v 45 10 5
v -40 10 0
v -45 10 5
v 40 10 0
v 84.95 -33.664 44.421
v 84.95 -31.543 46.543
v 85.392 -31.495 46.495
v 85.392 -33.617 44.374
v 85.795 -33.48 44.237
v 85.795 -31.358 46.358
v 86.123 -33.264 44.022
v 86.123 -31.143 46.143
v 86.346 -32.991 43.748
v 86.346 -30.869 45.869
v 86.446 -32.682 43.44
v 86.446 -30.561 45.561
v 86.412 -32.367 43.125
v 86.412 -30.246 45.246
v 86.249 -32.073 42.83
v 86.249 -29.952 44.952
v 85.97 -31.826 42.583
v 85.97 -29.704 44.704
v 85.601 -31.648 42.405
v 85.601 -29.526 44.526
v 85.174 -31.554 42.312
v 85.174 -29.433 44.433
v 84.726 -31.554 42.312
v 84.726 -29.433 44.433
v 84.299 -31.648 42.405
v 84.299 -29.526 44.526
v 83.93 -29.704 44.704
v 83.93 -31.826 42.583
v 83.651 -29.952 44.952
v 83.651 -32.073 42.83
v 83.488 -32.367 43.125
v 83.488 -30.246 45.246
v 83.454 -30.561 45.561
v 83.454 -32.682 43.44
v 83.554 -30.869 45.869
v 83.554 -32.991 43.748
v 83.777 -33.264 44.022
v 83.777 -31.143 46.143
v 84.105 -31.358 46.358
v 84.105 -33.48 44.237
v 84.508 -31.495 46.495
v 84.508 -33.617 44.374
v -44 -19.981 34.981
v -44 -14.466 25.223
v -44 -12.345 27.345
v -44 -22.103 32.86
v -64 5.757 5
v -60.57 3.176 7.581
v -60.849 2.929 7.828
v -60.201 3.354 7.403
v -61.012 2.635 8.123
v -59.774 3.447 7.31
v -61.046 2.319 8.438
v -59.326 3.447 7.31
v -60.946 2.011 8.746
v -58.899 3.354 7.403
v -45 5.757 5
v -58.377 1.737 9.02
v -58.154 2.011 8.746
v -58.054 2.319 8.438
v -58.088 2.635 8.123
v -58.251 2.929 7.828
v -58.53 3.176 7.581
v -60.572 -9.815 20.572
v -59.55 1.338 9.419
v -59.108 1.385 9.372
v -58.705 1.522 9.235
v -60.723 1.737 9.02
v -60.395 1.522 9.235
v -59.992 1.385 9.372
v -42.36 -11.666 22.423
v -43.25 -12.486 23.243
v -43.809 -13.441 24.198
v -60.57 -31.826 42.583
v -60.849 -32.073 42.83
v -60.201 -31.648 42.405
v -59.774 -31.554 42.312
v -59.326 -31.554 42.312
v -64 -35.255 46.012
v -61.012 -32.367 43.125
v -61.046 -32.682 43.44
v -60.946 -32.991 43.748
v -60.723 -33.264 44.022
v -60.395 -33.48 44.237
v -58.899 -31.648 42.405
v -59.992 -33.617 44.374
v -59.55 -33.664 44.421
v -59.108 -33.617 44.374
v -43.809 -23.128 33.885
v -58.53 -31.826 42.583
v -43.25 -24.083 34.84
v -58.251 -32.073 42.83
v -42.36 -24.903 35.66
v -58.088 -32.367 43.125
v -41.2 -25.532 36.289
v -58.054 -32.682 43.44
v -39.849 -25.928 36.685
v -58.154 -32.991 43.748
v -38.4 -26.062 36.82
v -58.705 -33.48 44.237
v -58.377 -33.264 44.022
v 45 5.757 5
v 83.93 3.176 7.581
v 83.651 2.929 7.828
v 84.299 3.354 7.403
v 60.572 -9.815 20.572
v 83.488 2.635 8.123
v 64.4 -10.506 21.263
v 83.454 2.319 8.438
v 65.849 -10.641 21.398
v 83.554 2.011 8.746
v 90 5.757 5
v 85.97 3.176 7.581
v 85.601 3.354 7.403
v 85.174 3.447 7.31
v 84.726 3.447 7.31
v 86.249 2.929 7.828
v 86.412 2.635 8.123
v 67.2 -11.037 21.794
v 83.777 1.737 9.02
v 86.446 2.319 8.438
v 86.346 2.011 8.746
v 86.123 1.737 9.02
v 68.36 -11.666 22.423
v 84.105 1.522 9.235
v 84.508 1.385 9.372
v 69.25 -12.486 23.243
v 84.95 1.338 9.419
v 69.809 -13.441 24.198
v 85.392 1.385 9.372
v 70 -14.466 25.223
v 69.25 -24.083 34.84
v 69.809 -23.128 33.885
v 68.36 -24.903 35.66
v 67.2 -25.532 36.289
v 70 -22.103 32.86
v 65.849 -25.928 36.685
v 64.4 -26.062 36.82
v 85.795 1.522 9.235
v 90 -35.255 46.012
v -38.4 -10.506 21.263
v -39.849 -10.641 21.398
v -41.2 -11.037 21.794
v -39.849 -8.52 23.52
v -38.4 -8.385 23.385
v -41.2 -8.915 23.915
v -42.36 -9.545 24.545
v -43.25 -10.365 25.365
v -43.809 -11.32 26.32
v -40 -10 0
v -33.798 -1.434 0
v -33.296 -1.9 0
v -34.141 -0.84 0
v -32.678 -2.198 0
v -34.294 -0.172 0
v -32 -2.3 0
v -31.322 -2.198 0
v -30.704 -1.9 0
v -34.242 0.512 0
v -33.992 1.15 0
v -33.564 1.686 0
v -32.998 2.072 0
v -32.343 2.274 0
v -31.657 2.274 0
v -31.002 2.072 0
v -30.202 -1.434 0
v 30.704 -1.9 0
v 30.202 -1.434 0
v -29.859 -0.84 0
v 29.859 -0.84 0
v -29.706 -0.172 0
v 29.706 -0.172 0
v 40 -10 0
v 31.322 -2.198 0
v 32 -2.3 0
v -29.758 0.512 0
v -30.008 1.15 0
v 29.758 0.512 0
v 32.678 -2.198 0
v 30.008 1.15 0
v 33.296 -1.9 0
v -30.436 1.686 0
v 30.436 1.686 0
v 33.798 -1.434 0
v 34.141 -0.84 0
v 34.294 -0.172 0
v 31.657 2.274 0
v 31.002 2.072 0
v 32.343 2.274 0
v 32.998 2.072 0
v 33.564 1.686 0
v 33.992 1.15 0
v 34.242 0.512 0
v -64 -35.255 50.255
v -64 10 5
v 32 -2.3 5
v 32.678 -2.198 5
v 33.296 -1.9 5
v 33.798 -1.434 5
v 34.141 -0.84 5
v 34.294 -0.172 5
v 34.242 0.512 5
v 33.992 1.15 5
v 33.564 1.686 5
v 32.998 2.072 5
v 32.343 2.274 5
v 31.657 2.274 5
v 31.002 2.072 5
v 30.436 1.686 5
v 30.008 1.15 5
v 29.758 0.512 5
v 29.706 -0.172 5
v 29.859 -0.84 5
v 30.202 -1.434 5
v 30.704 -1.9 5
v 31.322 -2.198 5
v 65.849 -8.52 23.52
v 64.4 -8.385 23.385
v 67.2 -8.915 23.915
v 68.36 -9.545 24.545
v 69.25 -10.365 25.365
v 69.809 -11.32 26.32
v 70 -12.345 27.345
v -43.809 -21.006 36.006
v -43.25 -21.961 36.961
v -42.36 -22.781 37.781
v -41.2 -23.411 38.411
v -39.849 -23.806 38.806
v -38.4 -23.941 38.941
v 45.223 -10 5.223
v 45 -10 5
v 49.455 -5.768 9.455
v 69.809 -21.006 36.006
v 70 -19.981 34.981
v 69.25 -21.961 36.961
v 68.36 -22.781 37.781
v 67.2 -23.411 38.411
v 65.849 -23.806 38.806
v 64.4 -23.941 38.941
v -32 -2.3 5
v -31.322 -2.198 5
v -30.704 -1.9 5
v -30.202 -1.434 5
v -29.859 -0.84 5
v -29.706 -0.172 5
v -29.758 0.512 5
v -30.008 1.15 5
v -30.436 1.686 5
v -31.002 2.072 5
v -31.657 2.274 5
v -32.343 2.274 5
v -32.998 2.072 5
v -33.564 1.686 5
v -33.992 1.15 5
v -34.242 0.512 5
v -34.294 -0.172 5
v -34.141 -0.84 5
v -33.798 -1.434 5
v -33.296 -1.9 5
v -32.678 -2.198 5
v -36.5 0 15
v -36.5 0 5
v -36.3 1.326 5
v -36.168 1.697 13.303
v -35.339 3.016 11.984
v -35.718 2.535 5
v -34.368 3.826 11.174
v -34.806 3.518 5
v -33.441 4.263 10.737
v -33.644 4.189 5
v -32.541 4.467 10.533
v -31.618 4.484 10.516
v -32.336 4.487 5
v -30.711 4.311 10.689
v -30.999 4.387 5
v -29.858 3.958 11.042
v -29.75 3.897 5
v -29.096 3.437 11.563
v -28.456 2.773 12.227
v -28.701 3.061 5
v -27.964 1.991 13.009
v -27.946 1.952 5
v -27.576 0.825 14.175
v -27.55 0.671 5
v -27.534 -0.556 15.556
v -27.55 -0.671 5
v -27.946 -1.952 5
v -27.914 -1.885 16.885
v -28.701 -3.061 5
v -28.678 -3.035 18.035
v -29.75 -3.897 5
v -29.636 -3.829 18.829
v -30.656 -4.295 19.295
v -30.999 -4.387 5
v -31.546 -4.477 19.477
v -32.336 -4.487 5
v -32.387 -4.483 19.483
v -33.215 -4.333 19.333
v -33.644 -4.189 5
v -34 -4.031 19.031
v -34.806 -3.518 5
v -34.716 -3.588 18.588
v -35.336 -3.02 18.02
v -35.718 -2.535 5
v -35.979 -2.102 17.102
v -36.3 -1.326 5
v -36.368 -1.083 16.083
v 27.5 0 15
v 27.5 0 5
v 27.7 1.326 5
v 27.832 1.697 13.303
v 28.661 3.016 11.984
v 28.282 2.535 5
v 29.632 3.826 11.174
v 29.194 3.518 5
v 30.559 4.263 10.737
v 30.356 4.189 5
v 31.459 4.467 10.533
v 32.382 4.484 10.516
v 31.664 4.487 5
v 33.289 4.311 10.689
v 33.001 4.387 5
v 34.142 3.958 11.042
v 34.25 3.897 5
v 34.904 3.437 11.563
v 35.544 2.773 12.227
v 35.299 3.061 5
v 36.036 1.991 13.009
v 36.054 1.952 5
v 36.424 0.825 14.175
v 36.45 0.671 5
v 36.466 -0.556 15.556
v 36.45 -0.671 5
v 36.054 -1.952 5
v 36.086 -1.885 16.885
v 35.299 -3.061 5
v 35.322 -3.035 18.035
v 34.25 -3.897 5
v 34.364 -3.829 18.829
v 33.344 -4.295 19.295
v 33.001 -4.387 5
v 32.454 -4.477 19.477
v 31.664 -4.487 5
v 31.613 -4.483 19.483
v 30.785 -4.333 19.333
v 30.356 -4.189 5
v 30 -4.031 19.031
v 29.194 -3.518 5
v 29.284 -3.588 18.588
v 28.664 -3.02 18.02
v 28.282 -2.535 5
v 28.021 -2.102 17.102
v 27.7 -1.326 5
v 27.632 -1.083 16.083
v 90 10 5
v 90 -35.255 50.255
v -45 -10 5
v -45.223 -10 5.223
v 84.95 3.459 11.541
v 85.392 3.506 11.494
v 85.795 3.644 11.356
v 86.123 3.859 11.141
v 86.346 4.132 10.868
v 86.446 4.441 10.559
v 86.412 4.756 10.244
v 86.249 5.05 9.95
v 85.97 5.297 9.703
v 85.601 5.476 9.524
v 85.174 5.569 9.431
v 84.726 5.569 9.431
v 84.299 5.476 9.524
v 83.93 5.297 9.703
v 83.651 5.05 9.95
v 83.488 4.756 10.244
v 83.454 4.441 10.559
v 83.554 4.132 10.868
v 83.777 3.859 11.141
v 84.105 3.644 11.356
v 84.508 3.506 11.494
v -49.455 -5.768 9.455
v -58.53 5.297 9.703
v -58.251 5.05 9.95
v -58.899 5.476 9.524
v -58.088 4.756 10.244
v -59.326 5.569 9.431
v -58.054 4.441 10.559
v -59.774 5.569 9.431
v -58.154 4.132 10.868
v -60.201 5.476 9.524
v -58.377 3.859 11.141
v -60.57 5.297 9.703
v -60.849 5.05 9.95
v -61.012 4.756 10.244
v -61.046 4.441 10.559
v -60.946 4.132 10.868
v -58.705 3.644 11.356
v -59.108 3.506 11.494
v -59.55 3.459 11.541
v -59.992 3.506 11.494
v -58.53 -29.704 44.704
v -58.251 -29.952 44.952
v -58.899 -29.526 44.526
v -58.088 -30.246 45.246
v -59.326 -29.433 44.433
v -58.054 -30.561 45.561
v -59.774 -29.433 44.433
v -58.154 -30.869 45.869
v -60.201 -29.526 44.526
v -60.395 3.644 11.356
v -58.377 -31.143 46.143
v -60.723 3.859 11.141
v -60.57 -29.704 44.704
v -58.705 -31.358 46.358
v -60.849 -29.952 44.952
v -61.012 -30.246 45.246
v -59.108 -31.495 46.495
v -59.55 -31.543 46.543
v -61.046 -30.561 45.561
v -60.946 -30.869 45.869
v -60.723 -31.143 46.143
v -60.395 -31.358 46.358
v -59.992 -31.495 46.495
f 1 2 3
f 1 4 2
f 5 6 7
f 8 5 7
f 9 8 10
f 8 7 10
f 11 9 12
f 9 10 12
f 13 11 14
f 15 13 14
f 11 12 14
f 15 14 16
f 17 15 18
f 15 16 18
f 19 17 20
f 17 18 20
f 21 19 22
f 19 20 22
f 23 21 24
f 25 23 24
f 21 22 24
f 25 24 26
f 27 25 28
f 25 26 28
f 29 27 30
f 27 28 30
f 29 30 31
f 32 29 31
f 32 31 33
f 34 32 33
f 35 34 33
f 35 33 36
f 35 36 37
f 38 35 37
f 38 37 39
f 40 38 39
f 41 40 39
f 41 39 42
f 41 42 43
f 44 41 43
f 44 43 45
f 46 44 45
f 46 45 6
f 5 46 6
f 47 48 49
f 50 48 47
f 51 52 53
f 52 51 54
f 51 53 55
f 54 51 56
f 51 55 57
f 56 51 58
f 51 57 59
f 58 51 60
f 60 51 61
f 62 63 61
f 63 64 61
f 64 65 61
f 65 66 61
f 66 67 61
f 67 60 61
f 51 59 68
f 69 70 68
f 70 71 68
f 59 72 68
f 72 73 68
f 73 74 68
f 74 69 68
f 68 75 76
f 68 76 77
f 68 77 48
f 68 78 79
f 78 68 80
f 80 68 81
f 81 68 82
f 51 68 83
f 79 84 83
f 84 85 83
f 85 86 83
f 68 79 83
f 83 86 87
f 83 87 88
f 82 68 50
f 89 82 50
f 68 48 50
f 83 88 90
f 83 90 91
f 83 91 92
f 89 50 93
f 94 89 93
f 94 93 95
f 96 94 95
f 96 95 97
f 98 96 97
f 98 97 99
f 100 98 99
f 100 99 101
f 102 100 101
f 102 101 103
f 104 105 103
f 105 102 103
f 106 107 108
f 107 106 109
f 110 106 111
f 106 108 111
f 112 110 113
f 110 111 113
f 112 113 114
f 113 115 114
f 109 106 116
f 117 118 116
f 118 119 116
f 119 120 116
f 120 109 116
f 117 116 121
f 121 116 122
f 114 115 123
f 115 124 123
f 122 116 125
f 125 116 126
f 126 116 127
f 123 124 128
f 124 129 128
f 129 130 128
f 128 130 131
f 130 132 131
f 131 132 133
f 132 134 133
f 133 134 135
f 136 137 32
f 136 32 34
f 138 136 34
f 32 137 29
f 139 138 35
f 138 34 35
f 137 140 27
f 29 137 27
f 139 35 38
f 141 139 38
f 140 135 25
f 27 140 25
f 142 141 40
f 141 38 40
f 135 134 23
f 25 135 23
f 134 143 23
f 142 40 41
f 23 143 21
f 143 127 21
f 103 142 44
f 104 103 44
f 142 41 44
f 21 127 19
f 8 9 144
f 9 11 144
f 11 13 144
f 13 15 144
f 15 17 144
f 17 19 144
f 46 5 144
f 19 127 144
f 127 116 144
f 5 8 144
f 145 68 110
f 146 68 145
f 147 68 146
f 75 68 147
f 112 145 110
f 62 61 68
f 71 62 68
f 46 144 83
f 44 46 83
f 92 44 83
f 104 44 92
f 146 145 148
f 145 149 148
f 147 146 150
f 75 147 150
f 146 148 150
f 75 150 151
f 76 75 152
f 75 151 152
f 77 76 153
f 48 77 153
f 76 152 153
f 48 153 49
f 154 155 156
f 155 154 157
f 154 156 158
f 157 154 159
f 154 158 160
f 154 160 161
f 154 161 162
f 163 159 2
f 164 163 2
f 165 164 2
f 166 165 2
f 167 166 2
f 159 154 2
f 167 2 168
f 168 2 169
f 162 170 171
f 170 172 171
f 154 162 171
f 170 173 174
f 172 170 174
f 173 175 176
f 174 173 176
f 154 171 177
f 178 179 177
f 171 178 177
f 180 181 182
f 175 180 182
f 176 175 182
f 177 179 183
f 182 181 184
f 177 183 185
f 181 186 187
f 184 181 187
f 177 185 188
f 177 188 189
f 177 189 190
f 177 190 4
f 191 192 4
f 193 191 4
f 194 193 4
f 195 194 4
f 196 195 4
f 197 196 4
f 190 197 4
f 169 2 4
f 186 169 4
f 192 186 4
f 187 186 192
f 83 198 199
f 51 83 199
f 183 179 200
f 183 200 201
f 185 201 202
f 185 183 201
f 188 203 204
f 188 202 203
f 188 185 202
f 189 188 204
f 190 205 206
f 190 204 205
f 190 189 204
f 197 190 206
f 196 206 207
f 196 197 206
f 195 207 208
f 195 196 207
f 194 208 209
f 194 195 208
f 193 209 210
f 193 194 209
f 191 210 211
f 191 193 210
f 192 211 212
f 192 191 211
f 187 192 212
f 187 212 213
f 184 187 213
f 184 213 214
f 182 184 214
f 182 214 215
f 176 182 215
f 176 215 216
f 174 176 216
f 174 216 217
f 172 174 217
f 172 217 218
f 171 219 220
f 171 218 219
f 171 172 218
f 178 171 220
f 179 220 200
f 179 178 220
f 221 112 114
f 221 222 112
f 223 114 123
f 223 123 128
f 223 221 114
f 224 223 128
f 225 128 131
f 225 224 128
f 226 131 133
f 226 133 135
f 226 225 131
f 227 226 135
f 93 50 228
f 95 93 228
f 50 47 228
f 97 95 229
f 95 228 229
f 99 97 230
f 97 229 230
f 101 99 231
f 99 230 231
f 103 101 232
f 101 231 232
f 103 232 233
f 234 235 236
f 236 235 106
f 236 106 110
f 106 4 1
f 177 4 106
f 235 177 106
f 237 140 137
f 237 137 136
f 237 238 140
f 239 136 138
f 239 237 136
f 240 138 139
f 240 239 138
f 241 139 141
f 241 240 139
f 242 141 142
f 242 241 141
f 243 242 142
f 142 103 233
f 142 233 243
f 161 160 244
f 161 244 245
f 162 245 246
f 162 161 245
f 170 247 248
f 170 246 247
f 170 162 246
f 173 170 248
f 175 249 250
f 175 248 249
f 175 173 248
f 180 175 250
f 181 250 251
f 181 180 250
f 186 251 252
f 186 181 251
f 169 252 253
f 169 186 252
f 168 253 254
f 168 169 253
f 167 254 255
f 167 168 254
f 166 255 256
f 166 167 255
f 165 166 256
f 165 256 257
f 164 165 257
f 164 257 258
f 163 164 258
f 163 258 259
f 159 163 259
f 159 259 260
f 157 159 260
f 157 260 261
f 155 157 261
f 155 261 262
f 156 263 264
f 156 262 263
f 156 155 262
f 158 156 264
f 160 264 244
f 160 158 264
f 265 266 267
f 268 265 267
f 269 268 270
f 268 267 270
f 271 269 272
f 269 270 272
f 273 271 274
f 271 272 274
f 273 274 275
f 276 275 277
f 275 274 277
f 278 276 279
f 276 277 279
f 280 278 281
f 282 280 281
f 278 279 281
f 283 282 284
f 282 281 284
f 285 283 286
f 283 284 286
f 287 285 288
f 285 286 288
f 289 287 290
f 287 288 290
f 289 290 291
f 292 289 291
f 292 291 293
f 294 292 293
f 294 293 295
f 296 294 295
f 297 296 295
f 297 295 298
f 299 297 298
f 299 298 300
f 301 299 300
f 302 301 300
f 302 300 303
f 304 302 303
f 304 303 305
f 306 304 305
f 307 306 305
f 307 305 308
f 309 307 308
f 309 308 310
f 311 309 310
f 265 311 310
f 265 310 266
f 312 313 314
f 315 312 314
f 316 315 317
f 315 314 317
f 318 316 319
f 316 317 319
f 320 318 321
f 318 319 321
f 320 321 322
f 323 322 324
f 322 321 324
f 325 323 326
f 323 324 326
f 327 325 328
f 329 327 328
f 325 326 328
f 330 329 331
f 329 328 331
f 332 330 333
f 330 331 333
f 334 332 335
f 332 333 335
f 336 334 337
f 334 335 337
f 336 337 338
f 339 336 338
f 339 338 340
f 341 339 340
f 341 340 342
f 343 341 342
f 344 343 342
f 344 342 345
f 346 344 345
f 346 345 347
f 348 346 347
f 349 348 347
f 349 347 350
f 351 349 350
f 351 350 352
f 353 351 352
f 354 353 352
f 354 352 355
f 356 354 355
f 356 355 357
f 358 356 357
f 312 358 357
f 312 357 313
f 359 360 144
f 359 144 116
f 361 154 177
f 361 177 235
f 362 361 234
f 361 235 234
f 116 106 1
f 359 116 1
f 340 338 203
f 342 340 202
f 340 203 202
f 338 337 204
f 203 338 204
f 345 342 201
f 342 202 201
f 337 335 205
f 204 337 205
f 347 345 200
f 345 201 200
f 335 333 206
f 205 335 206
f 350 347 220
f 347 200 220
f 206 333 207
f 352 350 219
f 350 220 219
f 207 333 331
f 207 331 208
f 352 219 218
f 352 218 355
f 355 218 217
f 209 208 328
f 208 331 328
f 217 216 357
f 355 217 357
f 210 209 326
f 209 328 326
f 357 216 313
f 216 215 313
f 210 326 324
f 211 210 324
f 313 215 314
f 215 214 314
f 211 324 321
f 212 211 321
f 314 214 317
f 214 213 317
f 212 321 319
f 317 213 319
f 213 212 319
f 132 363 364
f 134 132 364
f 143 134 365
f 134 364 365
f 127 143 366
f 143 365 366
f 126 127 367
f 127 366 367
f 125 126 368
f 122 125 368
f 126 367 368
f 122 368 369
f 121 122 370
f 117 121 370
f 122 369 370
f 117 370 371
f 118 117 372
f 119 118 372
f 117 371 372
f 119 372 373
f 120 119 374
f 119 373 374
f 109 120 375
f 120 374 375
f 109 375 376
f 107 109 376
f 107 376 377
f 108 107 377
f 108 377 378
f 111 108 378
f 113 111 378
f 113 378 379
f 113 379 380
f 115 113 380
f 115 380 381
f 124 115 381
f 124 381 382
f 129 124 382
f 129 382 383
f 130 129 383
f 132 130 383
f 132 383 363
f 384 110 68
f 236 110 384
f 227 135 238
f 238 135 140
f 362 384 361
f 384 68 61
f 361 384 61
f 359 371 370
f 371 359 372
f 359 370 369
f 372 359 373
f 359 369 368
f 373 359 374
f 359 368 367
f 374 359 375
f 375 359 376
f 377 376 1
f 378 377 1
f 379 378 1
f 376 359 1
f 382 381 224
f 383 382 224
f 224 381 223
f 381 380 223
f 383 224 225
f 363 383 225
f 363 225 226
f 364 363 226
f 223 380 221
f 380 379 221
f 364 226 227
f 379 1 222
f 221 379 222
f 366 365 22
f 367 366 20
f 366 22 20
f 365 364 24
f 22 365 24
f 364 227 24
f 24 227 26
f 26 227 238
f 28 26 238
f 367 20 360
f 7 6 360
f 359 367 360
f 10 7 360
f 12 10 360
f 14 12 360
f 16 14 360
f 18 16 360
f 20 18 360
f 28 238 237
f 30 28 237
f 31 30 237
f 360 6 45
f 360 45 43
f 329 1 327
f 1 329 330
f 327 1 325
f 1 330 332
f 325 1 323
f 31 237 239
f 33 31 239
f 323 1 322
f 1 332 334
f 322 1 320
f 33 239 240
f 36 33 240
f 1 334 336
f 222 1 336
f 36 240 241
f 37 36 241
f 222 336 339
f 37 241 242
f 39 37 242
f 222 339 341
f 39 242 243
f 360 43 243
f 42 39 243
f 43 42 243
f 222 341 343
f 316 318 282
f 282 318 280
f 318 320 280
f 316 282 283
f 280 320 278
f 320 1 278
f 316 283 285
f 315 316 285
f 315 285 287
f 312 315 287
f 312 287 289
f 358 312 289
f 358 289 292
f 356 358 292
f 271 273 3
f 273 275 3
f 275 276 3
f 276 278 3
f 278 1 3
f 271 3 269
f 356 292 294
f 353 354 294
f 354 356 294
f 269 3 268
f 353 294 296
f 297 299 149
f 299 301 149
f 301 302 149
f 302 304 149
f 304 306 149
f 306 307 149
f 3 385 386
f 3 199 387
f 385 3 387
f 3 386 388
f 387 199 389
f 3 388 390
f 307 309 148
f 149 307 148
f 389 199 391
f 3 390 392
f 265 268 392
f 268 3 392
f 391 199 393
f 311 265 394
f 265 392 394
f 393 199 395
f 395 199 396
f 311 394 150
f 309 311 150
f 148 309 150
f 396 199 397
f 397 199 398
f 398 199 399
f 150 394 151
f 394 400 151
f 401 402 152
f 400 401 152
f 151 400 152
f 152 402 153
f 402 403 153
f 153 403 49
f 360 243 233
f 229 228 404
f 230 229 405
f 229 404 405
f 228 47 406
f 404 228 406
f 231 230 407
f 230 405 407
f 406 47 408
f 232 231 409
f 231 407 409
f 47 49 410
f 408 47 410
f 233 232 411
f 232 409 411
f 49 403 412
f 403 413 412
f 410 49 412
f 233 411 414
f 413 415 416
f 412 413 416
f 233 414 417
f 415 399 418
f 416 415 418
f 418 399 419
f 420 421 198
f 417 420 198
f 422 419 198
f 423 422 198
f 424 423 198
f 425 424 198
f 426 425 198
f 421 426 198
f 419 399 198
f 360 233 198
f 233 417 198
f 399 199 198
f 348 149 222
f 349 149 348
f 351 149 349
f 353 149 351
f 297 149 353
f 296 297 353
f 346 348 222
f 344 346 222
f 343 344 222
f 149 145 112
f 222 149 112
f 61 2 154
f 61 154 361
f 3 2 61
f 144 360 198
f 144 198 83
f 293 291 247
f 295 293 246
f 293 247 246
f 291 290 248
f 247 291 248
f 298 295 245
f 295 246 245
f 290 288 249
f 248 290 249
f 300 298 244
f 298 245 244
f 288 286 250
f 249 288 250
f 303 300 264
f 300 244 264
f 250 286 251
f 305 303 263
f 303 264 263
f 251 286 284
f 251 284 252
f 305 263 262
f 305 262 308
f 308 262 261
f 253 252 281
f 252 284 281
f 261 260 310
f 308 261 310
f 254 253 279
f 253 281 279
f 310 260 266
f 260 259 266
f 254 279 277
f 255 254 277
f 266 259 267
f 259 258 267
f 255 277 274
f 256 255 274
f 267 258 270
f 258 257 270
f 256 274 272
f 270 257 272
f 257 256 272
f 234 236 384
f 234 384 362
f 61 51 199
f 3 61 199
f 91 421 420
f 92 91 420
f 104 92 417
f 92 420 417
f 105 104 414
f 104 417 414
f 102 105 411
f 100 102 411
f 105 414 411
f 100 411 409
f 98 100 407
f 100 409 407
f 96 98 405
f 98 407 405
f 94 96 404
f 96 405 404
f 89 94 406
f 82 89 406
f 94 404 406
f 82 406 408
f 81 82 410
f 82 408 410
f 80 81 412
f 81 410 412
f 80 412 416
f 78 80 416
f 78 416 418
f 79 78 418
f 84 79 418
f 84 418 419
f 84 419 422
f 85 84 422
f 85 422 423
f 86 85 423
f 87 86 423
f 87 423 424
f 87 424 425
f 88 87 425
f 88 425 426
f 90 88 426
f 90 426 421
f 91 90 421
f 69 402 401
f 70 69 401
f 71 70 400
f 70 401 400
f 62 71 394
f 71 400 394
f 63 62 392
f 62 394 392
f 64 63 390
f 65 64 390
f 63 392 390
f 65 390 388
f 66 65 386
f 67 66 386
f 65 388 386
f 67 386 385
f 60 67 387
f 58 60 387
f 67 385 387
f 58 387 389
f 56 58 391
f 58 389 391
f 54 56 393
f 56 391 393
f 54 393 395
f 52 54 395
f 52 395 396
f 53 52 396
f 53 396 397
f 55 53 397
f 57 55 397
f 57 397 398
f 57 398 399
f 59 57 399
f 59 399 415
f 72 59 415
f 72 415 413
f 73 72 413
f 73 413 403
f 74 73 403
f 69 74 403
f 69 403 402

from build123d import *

# Parameters (mm, degrees)
SKETCH1_W                = 80
SKETCH1_H                = 20
BOSS_EXTRUDE1_DEPTH      = 5
BOSS_EXTRUDE2_DEPTH      = 90
BOSS_EXTRUDE2_DEPTH_BACK = 64
SKETCH4_W                = 114
SKETCH4_H                = 22
CUT_EXTRUDE2_DEPTH       = 109.466361883
CHAMFER2_SIZE            = 11.3
CHAMFER2_SIZE_2          = 15.980613255
CHAMFER4_SIZE            = 5
CHAMFER4_SIZE2           = 10.722534603
CUT_EXTRUDE1_DEPTH       = 109.942423601
CUT_EXTRUDE1_DEPTH_BACK  = 109.942423601
SKETCH2_R                = 2.3
SKETCH5_R                = 4.5
CUT_EXTRUDE3_DEPTH       = 107.728174912
SKETCH6_R                = 1.5
CUT_EXTRUDE4_DEPTH       = 5
FILLET2_R                = 5.6


with BuildPart() as part:
    # Sketch1 → Boss-Extrude1 (new body)
    with BuildSketch(Plane.XY):
        Rectangle(SKETCH1_W, SKETCH1_H)
    extrude(amount=BOSS_EXTRUDE1_DEPTH)

    # Sketch3 → Boss-Extrude2 (add, two sides: drawn at the far end of the back side and taken through both)
    with BuildSketch(Plane(origin=(0, 0, 0), x_dir=(0, 0, -1), z_dir=(1, 0, 0)).offset(-BOSS_EXTRUDE2_DEPTH_BACK)):
        Polygon((-5, 10), (-50.254833996, -35.254833996), (-46.012193309, -35.254833996), (-5, 5.757359313), align=None)
    extrude(amount=BOSS_EXTRUDE2_DEPTH + BOSS_EXTRUDE2_DEPTH_BACK)

    # Sketch4 → Cut-Extrude2 (cut, through all)
    with BuildSketch(Plane(origin=(0, 5.378679656, 5.378679656), x_dir=(1, 0, 0), z_dir=(0, -0.7071067811865509, -0.7071067811865441))):
        with Locations((13, 33.464466094)):
            Rectangle(SKETCH4_W, SKETCH4_H)
    extrude(amount=-CUT_EXTRUDE2_DEPTH, mode=Mode.SUBTRACT)

    # Chamfer1
    # the kernel refuses this chamfer: 5 mm, written as the material it adds along each edge
    with BuildSketch(Plane(origin=(40, -25.102836543, 5), x_dir=(-0.027495876610586317, 0, -0.9996219169112968), z_dir=(0, 1, 0))) as chamfer1_piece_1_section:
        with BuildLine():
            Line((5.143365976, 0), (-0.282735774, -5.135588968))
            Line((-0.282735774, -5.135588968), (-0.382697966, -5.13283938))
            ThreePointArc((-0.382697966, -5.13283938), (-0.170646135, -2.566989148), (-0.099962192, 0.002749588))
            Line((-0.099962192, 0.002749588), (0.002749588, 0.099962192))
            ThreePointArc((0.002749588, 0.099962192), (2.572488324, 0.029278248), (5.146115564, 0.099962192))
            Line((5.146115564, 0.099962192), (5.143365976, 0))
        make_face()
    chamfer1_piece_1 = extrude(amount=35.102836543, mode=Mode.PRIVATE)
    chamfer1_piece_1 = split(chamfer1_piece_1, bisect_by=Plane(origin=(41.544288895, -10, 3.190389103), z_dir=(0, 1, 0)), keep=Keep.TOP, mode=Mode.PRIVATE)
    chamfer1_piece_1 = split(chamfer1_piece_1, bisect_by=Plane(origin=(41.544288895, -1.222319508, 0), z_dir=(0, 0, 1)), keep=Keep.TOP, mode=Mode.PRIVATE)
    chamfer1_piece_1 = split(chamfer1_piece_1, bisect_by=Plane(origin=(41.544288895, -1.222319508, 5), z_dir=(0, 0, -1)), keep=Keep.TOP, mode=Mode.PRIVATE)
    chamfer1_piece_1 = split(chamfer1_piece_1, bisect_by=Plane(origin=(41.544288895, 3.172325351, 7.585033962), z_dir=(0, -0.7071067811865511, -0.707106781186544)), keep=Keep.TOP, mode=Mode.PRIVATE)
    add(chamfer1_piece_1)
    with BuildSketch(Plane(origin=(40, -25.102836543, 5), x_dir=(-0.027495876610586317, 0, -0.9996219169112968), z_dir=(0, 1, 0))) as chamfer1_piece_2_section:
        with BuildLine():
            Line((5.143365976, 0), (-0.282735774, -5.135588968))
            Line((-0.282735774, -5.135588968), (-0.382697966, -5.13283938))
            ThreePointArc((-0.382697966, -5.13283938), (-0.170646135, -2.566989148), (-0.099962192, 0.002749588))
            Line((-0.099962192, 0.002749588), (0.002749588, 0.099962192))
            ThreePointArc((0.002749588, 0.099962192), (2.572488324, 0.029278248), (5.146115564, 0.099962192))
            Line((5.146115564, 0.099962192), (5.143365976, 0))
        make_face()
    chamfer1_piece_2 = extrude(amount=35.102836543, mode=Mode.PRIVATE)
    chamfer1_piece_2 = split(chamfer1_piece_2, bisect_by=Plane(origin=(41.882166071, 8.451075781, 5), z_dir=(0, 0, -1)), keep=Keep.TOP, mode=Mode.PRIVATE)
    chamfer1_piece_2 = split(chamfer1_piece_2, bisect_by=Plane(origin=(41.882166071, 7.676613671, 3.080745642), z_dir=(0, 0.7071067811865511, 0.707106781186544)), keep=Keep.TOP, mode=Mode.PRIVATE)
    add(chamfer1_piece_2)
    with BuildSketch(Plane(origin=(40, -25.102836543, 5), x_dir=(-0.027495876610586317, 0, -0.9996219169112968), z_dir=(0, 1, 0))) as chamfer1_piece_3_section:
        with BuildLine():
            Line((5.143365976, 0), (-0.282735774, -5.135588968))
            Line((-0.282735774, -5.135588968), (-0.382697966, -5.13283938))
            ThreePointArc((-0.382697966, -5.13283938), (-0.170646135, -2.566989148), (-0.099962192, 0.002749588))
            Line((-0.099962192, 0.002749588), (0.002749588, 0.099962192))
            ThreePointArc((0.002749588, 0.099962192), (2.572488324, 0.029278248), (5.146115564, 0.099962192))
            Line((5.146115564, 0.099962192), (5.143365976, 0))
        make_face()
    chamfer1_piece_3 = extrude(amount=35.102836543, mode=Mode.PRIVATE)
    chamfer1_piece_3 = split(chamfer1_piece_3, bisect_by=Plane(origin=(43.003980886, 7.808289703, 5), z_dir=(0, 0, 1)), keep=Keep.TOP, mode=Mode.PRIVATE)
    chamfer1_piece_3 = split(chamfer1_piece_3, bisect_by=Plane(origin=(43.003980886, 6.747629531, 4.009729782), z_dir=(0, 0.7071067811865511, 0.707106781186544)), keep=Keep.TOP, mode=Mode.PRIVATE)
    chamfer1_piece_3 = split(chamfer1_piece_3, bisect_by=Plane(origin=(43.003980886, 8.868949875, 6.131050125), z_dir=(0, -0.7071067811865511, -0.7071067811865439)), keep=Keep.TOP, mode=Mode.PRIVATE)
    add(chamfer1_piece_3)
    with BuildSketch(Plane(origin=(-40, 10, 5), x_dir=(0.027495876610586317, 0, -0.9996219169112968), z_dir=(0, -1, 0))) as chamfer1_piece_4_section:
        with BuildLine():
            Line((5.143365976, 0), (-0.282735774, -5.135588968))
            Line((-0.282735774, -5.135588968), (-0.382697966, -5.13283938))
            ThreePointArc((-0.382697966, -5.13283938), (-0.170646135, -2.566989148), (-0.099962192, 0.002749588))
            Line((-0.099962192, 0.002749588), (0.002749588, 0.099962192))
            ThreePointArc((0.002749588, 0.099962192), (2.572488324, 0.029278248), (5.146115564, 0.099962192))
            Line((5.146115564, 0.099962192), (5.143365976, 0))
        make_face()
    chamfer1_piece_4 = extrude(amount=35.102836543, mode=Mode.PRIVATE)
    chamfer1_piece_4 = split(chamfer1_piece_4, bisect_by=Plane(origin=(-41.882166071, 8.451075781, 5), z_dir=(0, 0, -1)), keep=Keep.TOP, mode=Mode.PRIVATE)
    chamfer1_piece_4 = split(chamfer1_piece_4, bisect_by=Plane(origin=(-41.882166071, 7.676613671, 3.080745642), z_dir=(0, 0.7071067811865511, 0.707106781186544)), keep=Keep.TOP, mode=Mode.PRIVATE)
    add(chamfer1_piece_4)
    with BuildSketch(Plane(origin=(-40, 10, 5), x_dir=(0.027495876610586317, 0, -0.9996219169112968), z_dir=(0, -1, 0))) as chamfer1_piece_5_section:
        with BuildLine():
            Line((5.143365976, 0), (-0.282735774, -5.135588968))
            Line((-0.282735774, -5.135588968), (-0.382697966, -5.13283938))
            ThreePointArc((-0.382697966, -5.13283938), (-0.170646135, -2.566989148), (-0.099962192, 0.002749588))
            Line((-0.099962192, 0.002749588), (0.002749588, 0.099962192))
            ThreePointArc((0.002749588, 0.099962192), (2.572488324, 0.029278248), (5.146115564, 0.099962192))
            Line((5.146115564, 0.099962192), (5.143365976, 0))
        make_face()
    chamfer1_piece_5 = extrude(amount=35.102836543, mode=Mode.PRIVATE)
    chamfer1_piece_5 = split(chamfer1_piece_5, bisect_by=Plane(origin=(-43.003980886, 7.808289703, 5), z_dir=(0, 0, 1)), keep=Keep.TOP, mode=Mode.PRIVATE)
    chamfer1_piece_5 = split(chamfer1_piece_5, bisect_by=Plane(origin=(-43.003980886, 6.747629531, 4.009729782), z_dir=(0, 0.7071067811865511, 0.707106781186544)), keep=Keep.TOP, mode=Mode.PRIVATE)
    chamfer1_piece_5 = split(chamfer1_piece_5, bisect_by=Plane(origin=(-43.003980886, 8.868949875, 6.131050125), z_dir=(0, -0.7071067811865511, -0.7071067811865439)), keep=Keep.TOP, mode=Mode.PRIVATE)
    add(chamfer1_piece_5)
    with BuildSketch(Plane(origin=(-40, 10, 5), x_dir=(0.027495876610586317, 0, -0.9996219169112968), z_dir=(0, -1, 0))) as chamfer1_piece_6_section:
        with BuildLine():
            Line((5.143365976, 0), (-0.282735774, -5.135588968))
            Line((-0.282735774, -5.135588968), (-0.382697966, -5.13283938))
            ThreePointArc((-0.382697966, -5.13283938), (-0.170646135, -2.566989148), (-0.099962192, 0.002749588))
            Line((-0.099962192, 0.002749588), (0.002749588, 0.099962192))
            ThreePointArc((0.002749588, 0.099962192), (2.572488324, 0.029278248), (5.146115564, 0.099962192))
            Line((5.146115564, 0.099962192), (5.143365976, 0))
        make_face()
    chamfer1_piece_6 = extrude(amount=35.102836543, mode=Mode.PRIVATE)
    chamfer1_piece_6 = split(chamfer1_piece_6, bisect_by=Plane(origin=(-41.544288895, -10, 3.190389103), z_dir=(0, 1, 0)), keep=Keep.TOP, mode=Mode.PRIVATE)
    chamfer1_piece_6 = split(chamfer1_piece_6, bisect_by=Plane(origin=(-41.544288895, -1.222319508, 0), z_dir=(0, 0, 1)), keep=Keep.TOP, mode=Mode.PRIVATE)
    chamfer1_piece_6 = split(chamfer1_piece_6, bisect_by=Plane(origin=(-41.544288895, -1.222319508, 5), z_dir=(0, 0, -1)), keep=Keep.TOP, mode=Mode.PRIVATE)
    chamfer1_piece_6 = split(chamfer1_piece_6, bisect_by=Plane(origin=(-41.544288895, 3.172325351, 7.585033962), z_dir=(0, -0.7071067811865511, -0.707106781186544)), keep=Keep.TOP, mode=Mode.PRIVATE)
    add(chamfer1_piece_6)

    # Chamfer2
    # the kernel refuses this chamfer: 15.980613255, 11.3 mm, written as the material it adds along each edge
    with BuildSketch(Plane(origin=(86.097071245, 5.757359313, 5), x_dir=(0, -0.6660419652145876, 0.745914271597675), z_dir=(-1, 0, 0))) as chamfer2_piece_1_section:
        Polygon((CHAMFER2_SIZE * 0.998403829789, -CHAMFER2_SIZE * 0.0564782494725), (CHAMFER2_SIZE_2 * 0.666041965207, -CHAMFER2_SIZE_2 * 0.745914271589), (0, 0), align=None)
    chamfer2_piece_1 = extrude(amount=172.194142489, mode=Mode.PRIVATE)
    chamfer2_piece_1 = split(chamfer2_piece_1, bisect_by=Plane(origin=(-23.869417759, -2.230051689, -16.130582241), z_dir=(0.7071067811862721, 0, 0.707106781186823)), keep=Keep.TOP, mode=Mode.PRIVATE)
    chamfer2_piece_1 = split(chamfer2_piece_1, bisect_by=Plane(origin=(23.869417759, -2.230051689, -16.130582241), z_dir=(-0.7071067811862721, 0, 0.707106781186823)), keep=Keep.TOP, mode=Mode.PRIVATE)
    chamfer2_piece_1 = split(chamfer2_piece_1, bisect_by=Plane(origin=(0, -10, 7.738835518), z_dir=(0, 1, 0)), keep=Keep.TOP, mode=Mode.PRIVATE)
    add(chamfer2_piece_1)

    # Chamfer4
    chamfer4_edges = [part.edges().sort_by_distance(p)[0] for p in [
        (0, -2.232947315, 12.990306627),
    ]]
    chamfer4_side = [part.faces().sort_by_distance(p)[0] for p in [
        (0, -6.014099628, 9.209154314),
    ]]
    chamfer(chamfer4_edges, length=CHAMFER4_SIZE, length2=CHAMFER4_SIZE2, reference=chamfer4_side[0])

    # Sketch2 → Cut-Extrude1 (cut, two sides: drawn at the far end of the back side and taken through both)
    with BuildSketch(Plane.XY.offset(-CUT_EXTRUDE1_DEPTH_BACK)):
        with Locations(Location((-32, 0, 0), (0, 0, 270))):
            Circle(SKETCH2_R)
        with Locations(Location((32, 0, 0), (0, 0, 270))):
            Circle(SKETCH2_R)
    extrude(amount=CUT_EXTRUDE1_DEPTH + CUT_EXTRUDE1_DEPTH_BACK, mode=Mode.SUBTRACT)

    # Sketch5 → Cut-Extrude3 (cut, through all)
    with BuildSketch(Plane(origin=(0, 0, 5), x_dir=(-1, 0, 0), z_dir=(0, 0, -1))):
        with Locations((-32, 0)):
            Circle(SKETCH5_R)
        with Locations((32, 0)):
            Circle(SKETCH5_R)
    extrude(amount=-CUT_EXTRUDE3_DEPTH, mode=Mode.SUBTRACT)

    # Sketch6 → Cut-Extrude4 (cut)
    with BuildSketch(Plane(origin=(0, 7.5, 7.5), x_dir=(1, 0, 0), z_dir=(0, 0.7071067811865511, 0.707106781186544))):
        with Locations(Location((-59.55, -4.214466094, 0), (0, 0, 270))):
            Circle(SKETCH6_R)
        with Locations(Location((-59.55, -53.714466094, 0), (0, 0, 270))):
            Circle(SKETCH6_R)
        with Locations(Location((84.95, -53.714466094, 0), (0, 0, 270))):
            Circle(SKETCH6_R)
        with Locations(Location((84.95, -4.214466094, 0), (0, 0, 270))):
            Circle(SKETCH6_R)
    extrude(amount=-CUT_EXTRUDE4_DEPTH, mode=Mode.SUBTRACT)

    # Fillet2
    fillet2_edges = [part.edges().sort_by_distance(p)[0] for p in [
        (-44, -9.445436483, 22.324116139),
        (-44, -25.001785669, 37.880465325),
        (70, -25.001785669, 37.880465325),
        (70, -9.445436483, 22.324116139),
    ]]
    fillet(fillet2_edges, radius=FILLET2_R)


solid = part.part
